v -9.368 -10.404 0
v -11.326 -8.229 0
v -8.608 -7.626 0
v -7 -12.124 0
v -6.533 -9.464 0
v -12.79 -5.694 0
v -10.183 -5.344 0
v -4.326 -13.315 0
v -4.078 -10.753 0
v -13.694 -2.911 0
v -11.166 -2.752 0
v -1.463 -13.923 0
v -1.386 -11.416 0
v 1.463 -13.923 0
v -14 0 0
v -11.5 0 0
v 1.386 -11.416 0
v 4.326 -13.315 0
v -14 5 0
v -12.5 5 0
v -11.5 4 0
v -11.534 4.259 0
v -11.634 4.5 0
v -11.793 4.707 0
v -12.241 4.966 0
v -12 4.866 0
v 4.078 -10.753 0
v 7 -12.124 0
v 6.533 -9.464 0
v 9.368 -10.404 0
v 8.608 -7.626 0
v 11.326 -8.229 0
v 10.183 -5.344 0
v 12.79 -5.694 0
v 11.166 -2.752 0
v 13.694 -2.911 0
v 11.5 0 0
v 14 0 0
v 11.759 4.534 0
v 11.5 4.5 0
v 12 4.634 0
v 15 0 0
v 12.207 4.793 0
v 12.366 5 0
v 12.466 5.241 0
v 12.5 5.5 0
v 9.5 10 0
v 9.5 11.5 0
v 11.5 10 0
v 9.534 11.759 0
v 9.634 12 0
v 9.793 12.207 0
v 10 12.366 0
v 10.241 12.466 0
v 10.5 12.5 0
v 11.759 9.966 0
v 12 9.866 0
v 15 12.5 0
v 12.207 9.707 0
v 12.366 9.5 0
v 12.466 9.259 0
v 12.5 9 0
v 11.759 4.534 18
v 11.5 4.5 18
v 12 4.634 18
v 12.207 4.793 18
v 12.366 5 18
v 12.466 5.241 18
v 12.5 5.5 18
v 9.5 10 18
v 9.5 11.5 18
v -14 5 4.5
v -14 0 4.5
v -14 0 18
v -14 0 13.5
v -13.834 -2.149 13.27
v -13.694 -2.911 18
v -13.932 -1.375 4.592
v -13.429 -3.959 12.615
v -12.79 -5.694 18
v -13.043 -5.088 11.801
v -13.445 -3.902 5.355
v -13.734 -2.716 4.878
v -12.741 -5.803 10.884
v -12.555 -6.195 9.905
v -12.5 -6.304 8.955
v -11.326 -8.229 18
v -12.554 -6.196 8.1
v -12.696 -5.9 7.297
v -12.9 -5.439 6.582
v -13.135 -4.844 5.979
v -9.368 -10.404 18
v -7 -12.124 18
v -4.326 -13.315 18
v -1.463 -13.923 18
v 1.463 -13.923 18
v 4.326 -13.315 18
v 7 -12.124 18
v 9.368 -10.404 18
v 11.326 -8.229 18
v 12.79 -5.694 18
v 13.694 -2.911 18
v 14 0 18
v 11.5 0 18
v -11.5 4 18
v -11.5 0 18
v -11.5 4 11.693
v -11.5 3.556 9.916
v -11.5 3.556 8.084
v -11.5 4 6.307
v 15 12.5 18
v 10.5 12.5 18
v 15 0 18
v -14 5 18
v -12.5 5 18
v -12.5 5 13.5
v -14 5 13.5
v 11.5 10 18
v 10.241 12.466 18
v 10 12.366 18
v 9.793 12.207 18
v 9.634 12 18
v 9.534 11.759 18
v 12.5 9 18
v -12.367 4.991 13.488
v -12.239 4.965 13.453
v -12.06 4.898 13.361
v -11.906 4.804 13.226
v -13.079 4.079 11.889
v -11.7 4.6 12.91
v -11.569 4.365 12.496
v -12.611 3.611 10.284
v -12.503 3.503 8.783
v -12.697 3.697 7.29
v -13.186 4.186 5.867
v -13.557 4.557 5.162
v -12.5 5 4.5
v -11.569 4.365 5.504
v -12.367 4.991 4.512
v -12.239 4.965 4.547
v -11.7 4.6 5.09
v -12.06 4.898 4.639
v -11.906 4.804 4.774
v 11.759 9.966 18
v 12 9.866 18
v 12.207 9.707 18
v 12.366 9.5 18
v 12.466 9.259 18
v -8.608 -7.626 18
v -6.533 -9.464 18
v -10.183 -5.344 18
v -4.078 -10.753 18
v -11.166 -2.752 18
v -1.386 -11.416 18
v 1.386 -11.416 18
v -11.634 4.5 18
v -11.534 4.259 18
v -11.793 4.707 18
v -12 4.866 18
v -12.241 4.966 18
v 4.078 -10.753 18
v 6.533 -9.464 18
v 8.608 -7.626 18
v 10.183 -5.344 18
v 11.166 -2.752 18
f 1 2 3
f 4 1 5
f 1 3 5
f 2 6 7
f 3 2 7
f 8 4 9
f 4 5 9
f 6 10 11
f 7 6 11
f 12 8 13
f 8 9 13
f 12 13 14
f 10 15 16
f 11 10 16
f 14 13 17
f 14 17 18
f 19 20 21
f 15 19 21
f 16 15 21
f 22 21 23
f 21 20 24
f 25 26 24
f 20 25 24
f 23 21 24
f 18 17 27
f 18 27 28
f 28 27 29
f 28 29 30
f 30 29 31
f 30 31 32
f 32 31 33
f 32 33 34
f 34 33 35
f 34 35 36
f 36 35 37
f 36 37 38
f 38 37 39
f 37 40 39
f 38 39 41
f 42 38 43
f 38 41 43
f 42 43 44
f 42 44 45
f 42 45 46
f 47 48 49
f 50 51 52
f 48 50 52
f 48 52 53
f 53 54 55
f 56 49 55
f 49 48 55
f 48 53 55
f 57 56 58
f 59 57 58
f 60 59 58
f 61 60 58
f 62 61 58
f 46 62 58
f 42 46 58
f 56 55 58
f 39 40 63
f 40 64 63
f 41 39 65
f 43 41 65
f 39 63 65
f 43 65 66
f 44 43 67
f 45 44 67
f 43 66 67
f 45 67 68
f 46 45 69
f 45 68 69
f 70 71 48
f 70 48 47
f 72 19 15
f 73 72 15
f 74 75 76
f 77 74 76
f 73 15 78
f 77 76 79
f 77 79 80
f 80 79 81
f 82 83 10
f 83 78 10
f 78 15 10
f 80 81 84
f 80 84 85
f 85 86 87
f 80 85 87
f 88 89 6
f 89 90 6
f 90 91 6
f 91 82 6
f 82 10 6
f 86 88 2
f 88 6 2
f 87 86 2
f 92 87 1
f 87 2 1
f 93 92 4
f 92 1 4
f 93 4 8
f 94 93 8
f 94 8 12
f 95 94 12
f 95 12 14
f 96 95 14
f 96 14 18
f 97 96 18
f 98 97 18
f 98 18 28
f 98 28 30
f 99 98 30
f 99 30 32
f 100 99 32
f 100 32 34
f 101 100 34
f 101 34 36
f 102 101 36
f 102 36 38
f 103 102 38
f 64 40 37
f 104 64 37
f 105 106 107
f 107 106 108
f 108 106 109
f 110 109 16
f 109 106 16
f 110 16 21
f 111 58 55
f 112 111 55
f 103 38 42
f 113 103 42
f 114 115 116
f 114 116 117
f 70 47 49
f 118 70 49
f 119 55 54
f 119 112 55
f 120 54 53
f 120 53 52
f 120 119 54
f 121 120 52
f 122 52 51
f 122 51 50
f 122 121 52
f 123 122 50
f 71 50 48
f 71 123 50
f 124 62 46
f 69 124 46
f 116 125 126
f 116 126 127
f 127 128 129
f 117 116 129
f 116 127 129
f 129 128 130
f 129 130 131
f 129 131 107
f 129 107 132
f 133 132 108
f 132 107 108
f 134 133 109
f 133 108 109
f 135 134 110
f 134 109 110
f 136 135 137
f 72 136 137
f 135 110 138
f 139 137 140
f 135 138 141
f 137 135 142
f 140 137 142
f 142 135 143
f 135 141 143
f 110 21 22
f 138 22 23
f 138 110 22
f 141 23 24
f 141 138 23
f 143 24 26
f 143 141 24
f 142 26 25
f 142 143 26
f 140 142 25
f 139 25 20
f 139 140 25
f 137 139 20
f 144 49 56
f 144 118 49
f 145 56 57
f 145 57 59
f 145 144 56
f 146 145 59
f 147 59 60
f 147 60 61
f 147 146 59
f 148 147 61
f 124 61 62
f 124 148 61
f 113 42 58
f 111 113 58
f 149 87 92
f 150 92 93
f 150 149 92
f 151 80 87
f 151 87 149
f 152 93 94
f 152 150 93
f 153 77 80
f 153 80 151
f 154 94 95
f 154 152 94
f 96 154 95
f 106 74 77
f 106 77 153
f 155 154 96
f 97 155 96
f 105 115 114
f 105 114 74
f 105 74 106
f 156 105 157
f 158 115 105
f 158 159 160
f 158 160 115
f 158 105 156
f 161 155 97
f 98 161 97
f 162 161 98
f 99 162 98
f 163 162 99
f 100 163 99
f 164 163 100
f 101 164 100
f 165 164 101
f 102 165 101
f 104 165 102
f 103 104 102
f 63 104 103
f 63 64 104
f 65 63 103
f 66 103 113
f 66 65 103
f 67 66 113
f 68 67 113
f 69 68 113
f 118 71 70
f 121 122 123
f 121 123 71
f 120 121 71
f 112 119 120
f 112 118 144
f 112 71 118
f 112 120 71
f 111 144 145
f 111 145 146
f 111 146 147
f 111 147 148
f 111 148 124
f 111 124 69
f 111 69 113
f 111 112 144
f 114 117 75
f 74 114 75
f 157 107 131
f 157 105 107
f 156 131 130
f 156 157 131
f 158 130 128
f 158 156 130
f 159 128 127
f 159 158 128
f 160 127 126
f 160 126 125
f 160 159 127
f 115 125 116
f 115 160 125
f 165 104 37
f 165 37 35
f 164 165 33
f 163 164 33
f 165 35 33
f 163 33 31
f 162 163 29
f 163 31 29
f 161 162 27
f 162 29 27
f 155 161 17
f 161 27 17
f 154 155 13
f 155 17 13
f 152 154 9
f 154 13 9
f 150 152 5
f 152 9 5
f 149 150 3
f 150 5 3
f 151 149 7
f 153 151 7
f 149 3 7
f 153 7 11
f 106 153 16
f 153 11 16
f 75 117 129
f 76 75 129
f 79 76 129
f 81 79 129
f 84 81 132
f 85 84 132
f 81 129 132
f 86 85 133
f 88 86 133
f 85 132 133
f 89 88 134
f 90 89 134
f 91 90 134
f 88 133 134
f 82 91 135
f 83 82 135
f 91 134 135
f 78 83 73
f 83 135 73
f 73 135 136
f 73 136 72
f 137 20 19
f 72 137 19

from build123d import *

# Parameters (mm, degrees)
F1_DEPTH = 18
F2_R     = 7.5
F3_DEPTH = 19.001
F4_R     = 7.5
F5_DEPTH = 25
F6_R     = 0.99999


# Not quite as in the source:
# - a fillet or chamfer is up to 0.001 mm smaller than in the source, because OpenCascade refuses the exact size


with BuildPart() as f1:
    # F0 (on Top) → F1 (new body)
    with BuildSketch(Plane.XY):
        with BuildLine():
            ThreePointArc((11.5, 0), (0, -11.5), (-11.5, 0))
            Line((-11.5, 0), (-11.5, 5))
            Line((-11.5, 5), (-14, 5))
            Line((-14, 5), (-14, 0))
            ThreePointArc((-14, 0), (0, -14), (14, 0))
            Line((14, 0), (15, 0))
            Line((15, 0), (15, 12.5))
            Line((15, 12.5), (9.5, 12.5))
            Line((9.5, 12.5), (9.5, 10))
            Line((9.5, 10), (12.5, 10))
            Line((12.5, 10), (12.5, 4.5))
            Line((12.5, 4.5), (11.5, 4.5))
            Line((11.5, 4.5), (11.5, 0))
        make_face()
    extrude(amount=F1_DEPTH)

    # F2 (on face) → F3 (cut, through all)
    with BuildSketch(Plane(origin=(0, 5, 0), x_dir=(-1, 0, 0), z_dir=(0, 1, 0))):
        with Locations((20, 9)):
            Circle(F2_R)
    extrude(amount=-F3_DEPTH, mode=Mode.SUBTRACT)

    # F4 (on face) → F5 (cut)
    with BuildSketch(Plane.YZ.offset(-11.5)):
        with Locations((11, 9)):
            Circle(F4_R)
    extrude(amount=-F5_DEPTH, mode=Mode.SUBTRACT)

    # F6 (radius 1 in the source; OpenCascade refuses exactly that, so slightly less here)
    f6_edges = [f1.edges().sort_by_distance(p)[0] for p in [
        (-11.5, 5, 15.75),
        (-11.5, 5, 2.25),
        (12.5, 4.5, 9),
        (12.5, 10, 9),
        (9.5, 12.5, 9),
    ]]
    fillet(f6_edges, radius=F6_R)


solid = f1.part
